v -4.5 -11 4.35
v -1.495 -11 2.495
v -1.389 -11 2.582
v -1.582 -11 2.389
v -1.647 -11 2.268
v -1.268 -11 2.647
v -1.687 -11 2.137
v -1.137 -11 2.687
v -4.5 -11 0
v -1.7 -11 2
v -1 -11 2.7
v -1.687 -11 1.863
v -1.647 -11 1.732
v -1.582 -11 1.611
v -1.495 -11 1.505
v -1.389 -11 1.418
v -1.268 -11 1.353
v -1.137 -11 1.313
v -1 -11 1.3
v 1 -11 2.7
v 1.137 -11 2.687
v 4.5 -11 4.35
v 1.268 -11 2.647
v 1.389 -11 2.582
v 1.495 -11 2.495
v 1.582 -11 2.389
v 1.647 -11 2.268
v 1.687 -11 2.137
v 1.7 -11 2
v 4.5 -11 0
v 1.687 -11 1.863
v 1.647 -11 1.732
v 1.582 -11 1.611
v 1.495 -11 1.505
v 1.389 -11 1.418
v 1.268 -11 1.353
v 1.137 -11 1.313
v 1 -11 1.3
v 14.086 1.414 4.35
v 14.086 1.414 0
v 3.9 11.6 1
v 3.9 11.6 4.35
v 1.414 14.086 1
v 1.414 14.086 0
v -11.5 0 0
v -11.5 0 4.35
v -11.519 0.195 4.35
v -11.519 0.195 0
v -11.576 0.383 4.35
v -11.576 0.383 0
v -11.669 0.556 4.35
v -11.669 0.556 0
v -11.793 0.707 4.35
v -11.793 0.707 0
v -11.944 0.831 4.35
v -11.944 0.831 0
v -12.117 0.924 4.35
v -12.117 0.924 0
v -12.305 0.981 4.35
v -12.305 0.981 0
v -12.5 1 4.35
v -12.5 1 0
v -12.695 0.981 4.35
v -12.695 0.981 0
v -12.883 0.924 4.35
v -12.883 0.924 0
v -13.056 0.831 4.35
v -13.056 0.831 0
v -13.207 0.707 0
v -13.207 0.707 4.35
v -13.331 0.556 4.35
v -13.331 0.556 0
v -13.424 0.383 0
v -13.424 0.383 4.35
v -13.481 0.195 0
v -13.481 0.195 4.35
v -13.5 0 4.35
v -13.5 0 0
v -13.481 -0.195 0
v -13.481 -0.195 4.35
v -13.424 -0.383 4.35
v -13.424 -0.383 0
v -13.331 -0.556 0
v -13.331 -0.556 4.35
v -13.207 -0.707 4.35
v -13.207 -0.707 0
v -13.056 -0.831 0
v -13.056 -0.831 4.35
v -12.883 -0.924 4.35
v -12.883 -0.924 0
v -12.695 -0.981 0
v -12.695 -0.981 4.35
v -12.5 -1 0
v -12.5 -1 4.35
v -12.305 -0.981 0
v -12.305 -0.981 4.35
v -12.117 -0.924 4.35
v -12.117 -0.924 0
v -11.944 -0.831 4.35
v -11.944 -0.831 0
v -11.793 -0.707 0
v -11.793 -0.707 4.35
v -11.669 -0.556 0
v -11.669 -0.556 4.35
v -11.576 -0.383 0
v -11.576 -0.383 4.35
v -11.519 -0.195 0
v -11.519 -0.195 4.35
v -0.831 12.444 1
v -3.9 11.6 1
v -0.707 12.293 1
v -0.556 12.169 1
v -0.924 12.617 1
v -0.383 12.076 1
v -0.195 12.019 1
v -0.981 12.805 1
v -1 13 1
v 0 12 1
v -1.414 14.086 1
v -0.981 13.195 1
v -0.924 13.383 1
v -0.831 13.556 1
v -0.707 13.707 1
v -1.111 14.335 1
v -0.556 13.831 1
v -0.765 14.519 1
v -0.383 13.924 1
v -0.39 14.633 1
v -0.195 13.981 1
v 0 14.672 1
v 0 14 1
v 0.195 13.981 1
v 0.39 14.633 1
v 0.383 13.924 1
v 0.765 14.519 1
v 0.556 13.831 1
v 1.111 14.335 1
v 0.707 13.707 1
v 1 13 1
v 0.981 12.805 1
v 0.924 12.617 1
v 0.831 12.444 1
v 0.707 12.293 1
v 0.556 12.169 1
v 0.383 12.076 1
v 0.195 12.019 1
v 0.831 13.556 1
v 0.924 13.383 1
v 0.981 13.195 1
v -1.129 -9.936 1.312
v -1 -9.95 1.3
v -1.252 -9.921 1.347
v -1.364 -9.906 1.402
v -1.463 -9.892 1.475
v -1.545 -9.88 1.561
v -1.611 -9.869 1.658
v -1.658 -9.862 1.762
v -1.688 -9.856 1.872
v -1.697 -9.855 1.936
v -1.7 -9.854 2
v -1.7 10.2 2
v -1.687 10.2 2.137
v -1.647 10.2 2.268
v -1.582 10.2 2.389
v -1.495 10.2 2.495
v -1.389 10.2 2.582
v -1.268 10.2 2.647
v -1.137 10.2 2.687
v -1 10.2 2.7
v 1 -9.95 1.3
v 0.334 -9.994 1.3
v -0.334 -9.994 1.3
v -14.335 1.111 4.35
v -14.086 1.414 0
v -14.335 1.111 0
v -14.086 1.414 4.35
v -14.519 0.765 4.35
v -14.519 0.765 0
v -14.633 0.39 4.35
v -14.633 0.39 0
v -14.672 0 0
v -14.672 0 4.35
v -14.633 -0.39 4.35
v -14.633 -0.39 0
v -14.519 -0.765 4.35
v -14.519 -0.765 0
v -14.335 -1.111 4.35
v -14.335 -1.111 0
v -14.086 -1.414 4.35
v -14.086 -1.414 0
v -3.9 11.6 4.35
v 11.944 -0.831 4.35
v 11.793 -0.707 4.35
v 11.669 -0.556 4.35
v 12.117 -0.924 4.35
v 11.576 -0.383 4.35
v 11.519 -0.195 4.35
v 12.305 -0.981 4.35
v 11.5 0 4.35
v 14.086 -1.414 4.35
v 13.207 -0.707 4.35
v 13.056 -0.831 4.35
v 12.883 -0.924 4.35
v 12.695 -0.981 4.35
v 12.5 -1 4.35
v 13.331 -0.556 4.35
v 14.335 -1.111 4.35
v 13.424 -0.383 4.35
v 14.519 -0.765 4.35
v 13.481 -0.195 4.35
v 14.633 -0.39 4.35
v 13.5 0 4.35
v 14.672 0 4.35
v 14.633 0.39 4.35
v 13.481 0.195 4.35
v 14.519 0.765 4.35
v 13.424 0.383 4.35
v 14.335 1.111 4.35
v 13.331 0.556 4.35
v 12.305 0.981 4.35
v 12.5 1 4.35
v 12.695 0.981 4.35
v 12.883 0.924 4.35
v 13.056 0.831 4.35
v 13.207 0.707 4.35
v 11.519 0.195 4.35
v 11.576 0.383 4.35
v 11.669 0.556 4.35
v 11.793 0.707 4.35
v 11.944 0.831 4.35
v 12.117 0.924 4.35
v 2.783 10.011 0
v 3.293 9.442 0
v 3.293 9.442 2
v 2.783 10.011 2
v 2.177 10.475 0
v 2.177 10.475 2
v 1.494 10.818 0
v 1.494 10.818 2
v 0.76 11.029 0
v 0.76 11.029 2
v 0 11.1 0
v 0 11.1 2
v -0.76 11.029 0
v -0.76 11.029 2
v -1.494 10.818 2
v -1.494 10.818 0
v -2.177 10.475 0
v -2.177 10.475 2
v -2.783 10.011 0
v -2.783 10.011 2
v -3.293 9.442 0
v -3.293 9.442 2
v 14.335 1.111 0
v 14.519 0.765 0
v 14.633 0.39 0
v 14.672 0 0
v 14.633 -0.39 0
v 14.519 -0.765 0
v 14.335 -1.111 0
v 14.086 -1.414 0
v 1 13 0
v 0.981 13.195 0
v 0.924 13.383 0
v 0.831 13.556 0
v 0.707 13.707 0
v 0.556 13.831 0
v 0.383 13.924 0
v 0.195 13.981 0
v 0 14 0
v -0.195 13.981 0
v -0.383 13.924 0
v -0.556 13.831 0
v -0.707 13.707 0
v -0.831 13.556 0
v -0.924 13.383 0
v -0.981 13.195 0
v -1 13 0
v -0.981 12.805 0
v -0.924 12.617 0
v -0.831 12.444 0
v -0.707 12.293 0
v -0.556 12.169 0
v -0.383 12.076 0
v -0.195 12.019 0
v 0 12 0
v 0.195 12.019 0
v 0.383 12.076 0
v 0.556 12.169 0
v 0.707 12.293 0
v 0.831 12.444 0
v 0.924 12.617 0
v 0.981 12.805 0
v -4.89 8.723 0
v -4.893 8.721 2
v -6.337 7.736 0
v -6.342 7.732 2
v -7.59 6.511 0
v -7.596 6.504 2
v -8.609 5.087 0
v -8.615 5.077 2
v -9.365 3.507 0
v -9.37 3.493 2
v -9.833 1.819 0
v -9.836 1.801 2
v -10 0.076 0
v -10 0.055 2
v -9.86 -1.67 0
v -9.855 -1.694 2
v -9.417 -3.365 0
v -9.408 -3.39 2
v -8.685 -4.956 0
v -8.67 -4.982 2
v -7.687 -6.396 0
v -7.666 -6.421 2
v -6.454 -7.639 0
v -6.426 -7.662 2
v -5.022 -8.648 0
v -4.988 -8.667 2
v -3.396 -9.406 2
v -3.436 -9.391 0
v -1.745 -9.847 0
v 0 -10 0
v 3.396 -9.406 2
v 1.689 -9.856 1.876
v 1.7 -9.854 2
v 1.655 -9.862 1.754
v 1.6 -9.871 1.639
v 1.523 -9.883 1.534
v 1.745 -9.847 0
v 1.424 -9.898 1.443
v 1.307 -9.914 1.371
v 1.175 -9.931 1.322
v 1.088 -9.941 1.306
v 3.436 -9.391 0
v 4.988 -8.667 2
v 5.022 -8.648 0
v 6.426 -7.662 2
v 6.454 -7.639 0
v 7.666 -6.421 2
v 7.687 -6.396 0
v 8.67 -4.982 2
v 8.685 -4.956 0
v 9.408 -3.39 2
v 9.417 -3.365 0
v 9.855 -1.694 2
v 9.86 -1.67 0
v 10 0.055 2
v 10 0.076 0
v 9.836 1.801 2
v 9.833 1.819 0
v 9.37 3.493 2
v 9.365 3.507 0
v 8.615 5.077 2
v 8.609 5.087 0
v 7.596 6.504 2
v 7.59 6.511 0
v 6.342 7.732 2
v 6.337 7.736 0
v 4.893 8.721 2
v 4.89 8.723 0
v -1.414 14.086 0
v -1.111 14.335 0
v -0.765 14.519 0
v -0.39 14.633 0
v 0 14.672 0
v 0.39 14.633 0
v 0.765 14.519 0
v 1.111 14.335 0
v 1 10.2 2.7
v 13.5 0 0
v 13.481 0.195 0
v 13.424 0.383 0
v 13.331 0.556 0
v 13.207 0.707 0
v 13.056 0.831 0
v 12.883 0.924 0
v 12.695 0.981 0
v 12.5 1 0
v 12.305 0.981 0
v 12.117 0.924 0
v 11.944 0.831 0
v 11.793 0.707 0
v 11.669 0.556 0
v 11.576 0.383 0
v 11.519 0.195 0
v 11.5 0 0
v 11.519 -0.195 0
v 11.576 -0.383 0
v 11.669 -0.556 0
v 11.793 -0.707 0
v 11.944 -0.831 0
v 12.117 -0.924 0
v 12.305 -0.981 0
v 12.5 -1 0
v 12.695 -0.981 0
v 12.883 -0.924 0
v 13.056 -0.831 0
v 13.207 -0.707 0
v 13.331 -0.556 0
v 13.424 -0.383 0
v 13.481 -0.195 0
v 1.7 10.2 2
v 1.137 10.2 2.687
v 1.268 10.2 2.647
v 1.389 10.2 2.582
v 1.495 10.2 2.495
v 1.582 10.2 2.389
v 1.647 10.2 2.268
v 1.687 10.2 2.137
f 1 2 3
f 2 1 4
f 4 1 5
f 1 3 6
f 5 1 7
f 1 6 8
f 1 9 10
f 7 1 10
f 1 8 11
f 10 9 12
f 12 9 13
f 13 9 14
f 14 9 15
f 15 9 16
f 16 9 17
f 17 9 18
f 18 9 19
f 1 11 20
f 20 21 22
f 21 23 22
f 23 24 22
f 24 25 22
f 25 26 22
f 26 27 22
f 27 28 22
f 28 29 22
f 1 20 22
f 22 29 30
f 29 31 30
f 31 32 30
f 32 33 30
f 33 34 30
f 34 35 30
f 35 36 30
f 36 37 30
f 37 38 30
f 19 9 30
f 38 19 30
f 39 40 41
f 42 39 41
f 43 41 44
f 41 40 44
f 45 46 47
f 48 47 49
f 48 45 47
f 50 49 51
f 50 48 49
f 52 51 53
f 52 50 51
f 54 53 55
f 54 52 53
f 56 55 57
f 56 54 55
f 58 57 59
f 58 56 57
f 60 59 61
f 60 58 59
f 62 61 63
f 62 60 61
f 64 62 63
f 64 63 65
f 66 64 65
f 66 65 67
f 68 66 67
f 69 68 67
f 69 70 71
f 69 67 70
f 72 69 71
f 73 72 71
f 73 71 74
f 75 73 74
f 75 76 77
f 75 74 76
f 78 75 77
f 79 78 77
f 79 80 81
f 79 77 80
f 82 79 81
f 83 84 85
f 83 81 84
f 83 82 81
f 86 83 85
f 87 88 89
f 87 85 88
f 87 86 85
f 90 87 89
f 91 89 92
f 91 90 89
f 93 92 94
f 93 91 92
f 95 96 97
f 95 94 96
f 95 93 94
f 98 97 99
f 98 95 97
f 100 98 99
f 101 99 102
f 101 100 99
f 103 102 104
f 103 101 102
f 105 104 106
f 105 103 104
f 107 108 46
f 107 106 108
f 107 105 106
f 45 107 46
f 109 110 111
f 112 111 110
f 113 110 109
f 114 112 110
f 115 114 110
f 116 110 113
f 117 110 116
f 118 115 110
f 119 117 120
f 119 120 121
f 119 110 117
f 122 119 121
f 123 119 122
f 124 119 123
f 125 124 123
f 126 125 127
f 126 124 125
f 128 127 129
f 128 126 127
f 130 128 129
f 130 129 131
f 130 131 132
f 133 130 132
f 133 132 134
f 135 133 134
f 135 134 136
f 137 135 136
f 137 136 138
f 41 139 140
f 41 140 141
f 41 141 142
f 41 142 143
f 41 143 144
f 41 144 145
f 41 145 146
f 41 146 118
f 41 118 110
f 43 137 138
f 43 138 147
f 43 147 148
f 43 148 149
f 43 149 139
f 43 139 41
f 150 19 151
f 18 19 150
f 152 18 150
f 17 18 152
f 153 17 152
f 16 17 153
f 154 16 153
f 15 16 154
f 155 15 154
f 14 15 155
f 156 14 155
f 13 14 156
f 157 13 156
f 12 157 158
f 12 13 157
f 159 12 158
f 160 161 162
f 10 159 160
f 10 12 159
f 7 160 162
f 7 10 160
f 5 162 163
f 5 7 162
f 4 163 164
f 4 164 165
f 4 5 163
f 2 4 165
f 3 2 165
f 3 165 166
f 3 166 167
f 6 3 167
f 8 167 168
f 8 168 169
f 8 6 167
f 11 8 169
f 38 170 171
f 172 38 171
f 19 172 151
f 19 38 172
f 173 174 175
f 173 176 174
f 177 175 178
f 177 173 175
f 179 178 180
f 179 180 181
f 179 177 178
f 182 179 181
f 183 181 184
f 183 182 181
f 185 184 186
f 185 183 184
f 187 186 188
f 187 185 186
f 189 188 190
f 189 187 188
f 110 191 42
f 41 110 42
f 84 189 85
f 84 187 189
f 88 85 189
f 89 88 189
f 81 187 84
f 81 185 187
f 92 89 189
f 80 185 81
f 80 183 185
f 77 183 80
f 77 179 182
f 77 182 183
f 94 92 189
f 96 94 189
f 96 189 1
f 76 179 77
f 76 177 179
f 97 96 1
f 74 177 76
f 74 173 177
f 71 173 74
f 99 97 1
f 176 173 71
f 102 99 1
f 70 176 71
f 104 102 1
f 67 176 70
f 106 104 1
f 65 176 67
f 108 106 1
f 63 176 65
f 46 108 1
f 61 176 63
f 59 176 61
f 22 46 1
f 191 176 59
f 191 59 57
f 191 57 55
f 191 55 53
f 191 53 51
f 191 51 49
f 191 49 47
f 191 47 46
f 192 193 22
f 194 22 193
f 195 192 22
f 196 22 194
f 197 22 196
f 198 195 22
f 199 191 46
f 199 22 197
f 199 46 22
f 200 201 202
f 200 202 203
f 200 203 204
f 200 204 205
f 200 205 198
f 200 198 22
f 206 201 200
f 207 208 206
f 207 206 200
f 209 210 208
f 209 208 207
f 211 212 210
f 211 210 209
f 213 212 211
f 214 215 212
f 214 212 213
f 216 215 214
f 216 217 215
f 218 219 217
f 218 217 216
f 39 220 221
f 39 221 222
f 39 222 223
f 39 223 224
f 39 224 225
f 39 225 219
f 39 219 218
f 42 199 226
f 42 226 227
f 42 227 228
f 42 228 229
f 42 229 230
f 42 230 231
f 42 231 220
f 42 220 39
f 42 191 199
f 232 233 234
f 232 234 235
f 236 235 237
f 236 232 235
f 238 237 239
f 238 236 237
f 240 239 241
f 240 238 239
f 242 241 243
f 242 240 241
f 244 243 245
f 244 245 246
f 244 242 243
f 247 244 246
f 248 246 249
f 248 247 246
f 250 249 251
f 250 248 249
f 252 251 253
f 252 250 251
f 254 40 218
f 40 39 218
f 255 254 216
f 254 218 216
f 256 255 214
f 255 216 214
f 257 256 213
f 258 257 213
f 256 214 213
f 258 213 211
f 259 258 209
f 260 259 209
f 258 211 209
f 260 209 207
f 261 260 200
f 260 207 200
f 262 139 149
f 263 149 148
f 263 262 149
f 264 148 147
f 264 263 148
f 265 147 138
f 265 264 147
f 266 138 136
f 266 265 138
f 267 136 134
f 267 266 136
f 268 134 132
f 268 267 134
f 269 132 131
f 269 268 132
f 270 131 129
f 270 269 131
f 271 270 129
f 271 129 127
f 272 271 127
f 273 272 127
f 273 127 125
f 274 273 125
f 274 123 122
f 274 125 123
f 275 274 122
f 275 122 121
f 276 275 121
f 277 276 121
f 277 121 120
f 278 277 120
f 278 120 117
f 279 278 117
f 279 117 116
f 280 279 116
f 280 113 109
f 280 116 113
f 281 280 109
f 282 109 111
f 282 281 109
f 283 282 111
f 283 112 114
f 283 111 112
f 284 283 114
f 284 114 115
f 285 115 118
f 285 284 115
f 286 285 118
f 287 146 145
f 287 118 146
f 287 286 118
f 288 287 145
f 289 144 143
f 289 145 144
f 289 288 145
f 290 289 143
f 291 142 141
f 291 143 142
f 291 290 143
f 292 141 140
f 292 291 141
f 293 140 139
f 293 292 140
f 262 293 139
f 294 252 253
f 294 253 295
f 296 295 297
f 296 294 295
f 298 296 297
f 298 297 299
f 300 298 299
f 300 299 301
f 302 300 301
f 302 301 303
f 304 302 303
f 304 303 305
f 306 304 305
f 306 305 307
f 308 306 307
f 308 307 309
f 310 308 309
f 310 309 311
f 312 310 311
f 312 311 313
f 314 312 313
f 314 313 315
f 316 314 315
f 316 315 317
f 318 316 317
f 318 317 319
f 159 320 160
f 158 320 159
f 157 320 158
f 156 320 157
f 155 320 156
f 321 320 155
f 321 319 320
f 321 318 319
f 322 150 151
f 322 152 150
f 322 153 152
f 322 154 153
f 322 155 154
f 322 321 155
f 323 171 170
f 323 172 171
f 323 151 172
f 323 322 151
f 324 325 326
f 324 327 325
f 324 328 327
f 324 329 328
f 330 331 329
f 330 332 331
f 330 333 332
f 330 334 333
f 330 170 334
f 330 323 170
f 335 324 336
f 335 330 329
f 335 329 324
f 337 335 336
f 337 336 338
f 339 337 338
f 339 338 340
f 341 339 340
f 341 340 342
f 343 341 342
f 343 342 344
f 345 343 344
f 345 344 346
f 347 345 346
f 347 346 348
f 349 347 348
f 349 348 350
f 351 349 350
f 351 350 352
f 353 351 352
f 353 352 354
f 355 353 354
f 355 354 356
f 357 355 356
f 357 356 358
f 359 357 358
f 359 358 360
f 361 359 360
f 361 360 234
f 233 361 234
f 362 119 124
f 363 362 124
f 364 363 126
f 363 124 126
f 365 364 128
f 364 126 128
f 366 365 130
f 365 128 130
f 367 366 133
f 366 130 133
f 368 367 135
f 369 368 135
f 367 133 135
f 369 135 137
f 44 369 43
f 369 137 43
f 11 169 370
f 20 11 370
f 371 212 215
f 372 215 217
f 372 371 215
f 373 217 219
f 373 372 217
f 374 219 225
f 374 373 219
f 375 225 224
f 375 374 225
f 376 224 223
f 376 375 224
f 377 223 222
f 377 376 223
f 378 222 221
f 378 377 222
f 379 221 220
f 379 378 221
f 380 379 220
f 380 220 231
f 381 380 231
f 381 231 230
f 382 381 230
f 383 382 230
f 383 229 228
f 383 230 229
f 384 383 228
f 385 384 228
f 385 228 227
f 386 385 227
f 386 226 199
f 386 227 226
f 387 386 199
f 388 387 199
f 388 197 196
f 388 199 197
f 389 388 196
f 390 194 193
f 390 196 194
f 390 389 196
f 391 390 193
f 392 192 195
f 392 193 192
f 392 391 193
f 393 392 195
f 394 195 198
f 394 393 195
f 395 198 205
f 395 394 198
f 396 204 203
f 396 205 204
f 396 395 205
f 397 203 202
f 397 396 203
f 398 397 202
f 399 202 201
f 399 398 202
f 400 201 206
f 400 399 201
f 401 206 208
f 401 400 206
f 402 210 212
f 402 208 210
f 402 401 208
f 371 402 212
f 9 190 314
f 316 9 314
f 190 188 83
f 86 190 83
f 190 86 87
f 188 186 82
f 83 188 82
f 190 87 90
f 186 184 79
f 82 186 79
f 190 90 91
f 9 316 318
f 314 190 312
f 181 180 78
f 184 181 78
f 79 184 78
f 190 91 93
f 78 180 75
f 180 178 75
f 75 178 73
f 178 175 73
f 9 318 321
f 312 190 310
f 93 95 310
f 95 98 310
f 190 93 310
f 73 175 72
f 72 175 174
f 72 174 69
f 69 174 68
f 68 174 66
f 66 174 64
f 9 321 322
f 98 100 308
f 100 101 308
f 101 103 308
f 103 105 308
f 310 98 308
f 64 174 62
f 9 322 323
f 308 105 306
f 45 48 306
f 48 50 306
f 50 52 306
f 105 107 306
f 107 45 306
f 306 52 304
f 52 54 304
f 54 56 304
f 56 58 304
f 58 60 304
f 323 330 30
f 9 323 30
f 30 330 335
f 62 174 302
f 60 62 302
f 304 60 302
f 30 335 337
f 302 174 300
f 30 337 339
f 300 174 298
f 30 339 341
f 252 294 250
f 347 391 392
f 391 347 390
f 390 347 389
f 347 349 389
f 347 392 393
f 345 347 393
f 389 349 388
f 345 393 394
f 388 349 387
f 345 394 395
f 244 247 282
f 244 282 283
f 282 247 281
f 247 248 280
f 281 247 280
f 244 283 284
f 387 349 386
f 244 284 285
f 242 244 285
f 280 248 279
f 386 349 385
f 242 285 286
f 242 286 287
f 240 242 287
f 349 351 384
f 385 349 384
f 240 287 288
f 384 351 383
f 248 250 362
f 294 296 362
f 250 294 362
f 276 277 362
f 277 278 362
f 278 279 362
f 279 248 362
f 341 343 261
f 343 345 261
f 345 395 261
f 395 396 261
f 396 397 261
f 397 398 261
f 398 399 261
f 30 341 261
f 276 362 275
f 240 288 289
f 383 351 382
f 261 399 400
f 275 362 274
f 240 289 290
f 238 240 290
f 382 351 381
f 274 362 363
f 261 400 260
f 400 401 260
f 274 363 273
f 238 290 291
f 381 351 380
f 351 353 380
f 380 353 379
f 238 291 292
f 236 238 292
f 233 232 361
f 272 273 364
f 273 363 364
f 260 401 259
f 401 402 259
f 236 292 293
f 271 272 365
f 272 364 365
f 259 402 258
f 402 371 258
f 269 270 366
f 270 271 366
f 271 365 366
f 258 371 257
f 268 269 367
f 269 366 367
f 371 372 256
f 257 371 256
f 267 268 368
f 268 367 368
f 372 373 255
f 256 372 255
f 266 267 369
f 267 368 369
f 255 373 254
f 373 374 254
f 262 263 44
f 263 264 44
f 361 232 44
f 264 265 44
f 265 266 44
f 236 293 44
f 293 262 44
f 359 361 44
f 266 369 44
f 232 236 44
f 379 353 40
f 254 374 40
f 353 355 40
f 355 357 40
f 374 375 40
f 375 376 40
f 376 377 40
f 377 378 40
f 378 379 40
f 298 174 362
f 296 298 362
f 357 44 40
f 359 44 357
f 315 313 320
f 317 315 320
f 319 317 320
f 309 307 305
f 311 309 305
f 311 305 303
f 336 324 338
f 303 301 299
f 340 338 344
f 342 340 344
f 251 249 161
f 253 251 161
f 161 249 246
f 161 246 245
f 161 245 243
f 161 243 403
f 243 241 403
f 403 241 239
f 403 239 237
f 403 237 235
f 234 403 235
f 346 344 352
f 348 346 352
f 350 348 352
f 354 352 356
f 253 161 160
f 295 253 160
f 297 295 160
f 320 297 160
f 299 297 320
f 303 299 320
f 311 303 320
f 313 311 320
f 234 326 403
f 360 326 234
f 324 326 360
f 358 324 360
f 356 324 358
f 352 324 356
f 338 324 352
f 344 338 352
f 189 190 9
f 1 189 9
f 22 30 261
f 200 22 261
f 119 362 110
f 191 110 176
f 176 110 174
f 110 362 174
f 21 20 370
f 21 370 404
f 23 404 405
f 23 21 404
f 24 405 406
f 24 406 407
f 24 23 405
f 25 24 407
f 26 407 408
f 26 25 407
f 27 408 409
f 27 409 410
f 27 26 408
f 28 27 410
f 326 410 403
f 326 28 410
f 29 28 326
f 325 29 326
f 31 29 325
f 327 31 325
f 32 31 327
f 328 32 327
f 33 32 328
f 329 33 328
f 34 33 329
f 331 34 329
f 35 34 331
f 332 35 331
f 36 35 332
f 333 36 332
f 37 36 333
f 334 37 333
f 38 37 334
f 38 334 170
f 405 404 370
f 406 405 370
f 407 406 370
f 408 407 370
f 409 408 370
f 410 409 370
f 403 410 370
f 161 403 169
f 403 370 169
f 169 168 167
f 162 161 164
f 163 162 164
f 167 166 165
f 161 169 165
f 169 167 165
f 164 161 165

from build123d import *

# Parameters (mm, degrees)
BOSS_EXTRUDE1_DEPTH = 4.35
SKETCH1_3_R         = 1
CUT_EXTRUDE1_DEPTH  = 5.35
SKETCH1_4_R         = 10
SKETCH1_4_R_2       = 4.1
CUT_EXTRUDE2_DEPTH  = 2
FILLET1_R           = 2
CUT_EXTRUDE3_DEPTH  = 5.35
CUT_EXTRUDE4_DEPTH  = 21.2
CUT_EXTRUDE5_DEPTH  = 3.35


with BuildPart() as part:
    # Sketch1 → Boss-Extrude1 (new body)
    with BuildSketch(Plane.XY):
        Polygon((0, 15.5), (-15.5, 0), (0, -15.5), (15.5, 0), align=None)
    extrude(amount=BOSS_EXTRUDE1_DEPTH)

    # Sketch1<3> → Cut-Extrude1 (cut, through all)
    with BuildSketch(Plane.XY):
        with Locations((-12.5, 0)):
            Circle(SKETCH1_3_R)
        with Locations((12.5, 0)):
            Circle(SKETCH1_3_R)
        with Locations((0, 13)):
            Circle(SKETCH1_3_R)
    extrude(amount=CUT_EXTRUDE1_DEPTH, mode=Mode.SUBTRACT)

    # Sketch1<4> → Cut-Extrude2 (cut)
    with BuildSketch(Plane.XY):
        Circle(SKETCH1_4_R)
        with Locations((0, 7)):
            Circle(SKETCH1_4_R_2)
    extrude(amount=CUT_EXTRUDE2_DEPTH, mode=Mode.SUBTRACT)

    # Fillet1
    fillet1_edges = [part.edges().sort_by_distance(p)[0] for p in [
        (0, -15.5, 2.175),
        (-15.5, 0, 2.175),
        (0, 15.5, 2.175),
        (15.5, 0, 2.175),
    ]]
    fillet(fillet1_edges, radius=FILLET1_R)

    # Sketch2 → Cut-Extrude3 (cut, through all)
    with BuildSketch(Plane(origin=(0, 0, 0), x_dir=(-1, 0, 0), z_dir=(0, 0, -1))):
        with BuildLine():
            Line((4.5, -11), (-4.5, -11))
            Line((-4.5, -11), (-1.414213562, -14.085786438))
            ThreePointArc((-1.414213562, -14.085786438), (0, -14.671572875), (1.414213562, -14.085786438))
            Line((1.414213562, -14.085786438), (4.5, -11))
        make_face()
    extrude(amount=-CUT_EXTRUDE3_DEPTH, mode=Mode.SUBTRACT)

    # Sketch4 → Cut-Extrude4 (cut)
    with BuildSketch(Plane.XZ.offset(11)):
        with BuildLine():
            Line((-1, 2.7), (1, 2.7))
            ThreePointArc((1, 2.7), (1.7, 2), (1, 1.3))
            Line((1, 1.3), (-1, 1.3))
            ThreePointArc((-1, 1.3), (-1.7, 2), (-1, 2.7))
        make_face()
    extrude(amount=-CUT_EXTRUDE4_DEPTH, mode=Mode.SUBTRACT)

    # Sketch11 → Cut-Extrude5 (cut)
    with BuildSketch(Plane.XY.offset(4.35)):
        Polygon((-3.9, 11.6), (3.9, 11.6), (0, 15.5), align=None)
    extrude(amount=-CUT_EXTRUDE5_DEPTH, mode=Mode.SUBTRACT)


solid = part.part
